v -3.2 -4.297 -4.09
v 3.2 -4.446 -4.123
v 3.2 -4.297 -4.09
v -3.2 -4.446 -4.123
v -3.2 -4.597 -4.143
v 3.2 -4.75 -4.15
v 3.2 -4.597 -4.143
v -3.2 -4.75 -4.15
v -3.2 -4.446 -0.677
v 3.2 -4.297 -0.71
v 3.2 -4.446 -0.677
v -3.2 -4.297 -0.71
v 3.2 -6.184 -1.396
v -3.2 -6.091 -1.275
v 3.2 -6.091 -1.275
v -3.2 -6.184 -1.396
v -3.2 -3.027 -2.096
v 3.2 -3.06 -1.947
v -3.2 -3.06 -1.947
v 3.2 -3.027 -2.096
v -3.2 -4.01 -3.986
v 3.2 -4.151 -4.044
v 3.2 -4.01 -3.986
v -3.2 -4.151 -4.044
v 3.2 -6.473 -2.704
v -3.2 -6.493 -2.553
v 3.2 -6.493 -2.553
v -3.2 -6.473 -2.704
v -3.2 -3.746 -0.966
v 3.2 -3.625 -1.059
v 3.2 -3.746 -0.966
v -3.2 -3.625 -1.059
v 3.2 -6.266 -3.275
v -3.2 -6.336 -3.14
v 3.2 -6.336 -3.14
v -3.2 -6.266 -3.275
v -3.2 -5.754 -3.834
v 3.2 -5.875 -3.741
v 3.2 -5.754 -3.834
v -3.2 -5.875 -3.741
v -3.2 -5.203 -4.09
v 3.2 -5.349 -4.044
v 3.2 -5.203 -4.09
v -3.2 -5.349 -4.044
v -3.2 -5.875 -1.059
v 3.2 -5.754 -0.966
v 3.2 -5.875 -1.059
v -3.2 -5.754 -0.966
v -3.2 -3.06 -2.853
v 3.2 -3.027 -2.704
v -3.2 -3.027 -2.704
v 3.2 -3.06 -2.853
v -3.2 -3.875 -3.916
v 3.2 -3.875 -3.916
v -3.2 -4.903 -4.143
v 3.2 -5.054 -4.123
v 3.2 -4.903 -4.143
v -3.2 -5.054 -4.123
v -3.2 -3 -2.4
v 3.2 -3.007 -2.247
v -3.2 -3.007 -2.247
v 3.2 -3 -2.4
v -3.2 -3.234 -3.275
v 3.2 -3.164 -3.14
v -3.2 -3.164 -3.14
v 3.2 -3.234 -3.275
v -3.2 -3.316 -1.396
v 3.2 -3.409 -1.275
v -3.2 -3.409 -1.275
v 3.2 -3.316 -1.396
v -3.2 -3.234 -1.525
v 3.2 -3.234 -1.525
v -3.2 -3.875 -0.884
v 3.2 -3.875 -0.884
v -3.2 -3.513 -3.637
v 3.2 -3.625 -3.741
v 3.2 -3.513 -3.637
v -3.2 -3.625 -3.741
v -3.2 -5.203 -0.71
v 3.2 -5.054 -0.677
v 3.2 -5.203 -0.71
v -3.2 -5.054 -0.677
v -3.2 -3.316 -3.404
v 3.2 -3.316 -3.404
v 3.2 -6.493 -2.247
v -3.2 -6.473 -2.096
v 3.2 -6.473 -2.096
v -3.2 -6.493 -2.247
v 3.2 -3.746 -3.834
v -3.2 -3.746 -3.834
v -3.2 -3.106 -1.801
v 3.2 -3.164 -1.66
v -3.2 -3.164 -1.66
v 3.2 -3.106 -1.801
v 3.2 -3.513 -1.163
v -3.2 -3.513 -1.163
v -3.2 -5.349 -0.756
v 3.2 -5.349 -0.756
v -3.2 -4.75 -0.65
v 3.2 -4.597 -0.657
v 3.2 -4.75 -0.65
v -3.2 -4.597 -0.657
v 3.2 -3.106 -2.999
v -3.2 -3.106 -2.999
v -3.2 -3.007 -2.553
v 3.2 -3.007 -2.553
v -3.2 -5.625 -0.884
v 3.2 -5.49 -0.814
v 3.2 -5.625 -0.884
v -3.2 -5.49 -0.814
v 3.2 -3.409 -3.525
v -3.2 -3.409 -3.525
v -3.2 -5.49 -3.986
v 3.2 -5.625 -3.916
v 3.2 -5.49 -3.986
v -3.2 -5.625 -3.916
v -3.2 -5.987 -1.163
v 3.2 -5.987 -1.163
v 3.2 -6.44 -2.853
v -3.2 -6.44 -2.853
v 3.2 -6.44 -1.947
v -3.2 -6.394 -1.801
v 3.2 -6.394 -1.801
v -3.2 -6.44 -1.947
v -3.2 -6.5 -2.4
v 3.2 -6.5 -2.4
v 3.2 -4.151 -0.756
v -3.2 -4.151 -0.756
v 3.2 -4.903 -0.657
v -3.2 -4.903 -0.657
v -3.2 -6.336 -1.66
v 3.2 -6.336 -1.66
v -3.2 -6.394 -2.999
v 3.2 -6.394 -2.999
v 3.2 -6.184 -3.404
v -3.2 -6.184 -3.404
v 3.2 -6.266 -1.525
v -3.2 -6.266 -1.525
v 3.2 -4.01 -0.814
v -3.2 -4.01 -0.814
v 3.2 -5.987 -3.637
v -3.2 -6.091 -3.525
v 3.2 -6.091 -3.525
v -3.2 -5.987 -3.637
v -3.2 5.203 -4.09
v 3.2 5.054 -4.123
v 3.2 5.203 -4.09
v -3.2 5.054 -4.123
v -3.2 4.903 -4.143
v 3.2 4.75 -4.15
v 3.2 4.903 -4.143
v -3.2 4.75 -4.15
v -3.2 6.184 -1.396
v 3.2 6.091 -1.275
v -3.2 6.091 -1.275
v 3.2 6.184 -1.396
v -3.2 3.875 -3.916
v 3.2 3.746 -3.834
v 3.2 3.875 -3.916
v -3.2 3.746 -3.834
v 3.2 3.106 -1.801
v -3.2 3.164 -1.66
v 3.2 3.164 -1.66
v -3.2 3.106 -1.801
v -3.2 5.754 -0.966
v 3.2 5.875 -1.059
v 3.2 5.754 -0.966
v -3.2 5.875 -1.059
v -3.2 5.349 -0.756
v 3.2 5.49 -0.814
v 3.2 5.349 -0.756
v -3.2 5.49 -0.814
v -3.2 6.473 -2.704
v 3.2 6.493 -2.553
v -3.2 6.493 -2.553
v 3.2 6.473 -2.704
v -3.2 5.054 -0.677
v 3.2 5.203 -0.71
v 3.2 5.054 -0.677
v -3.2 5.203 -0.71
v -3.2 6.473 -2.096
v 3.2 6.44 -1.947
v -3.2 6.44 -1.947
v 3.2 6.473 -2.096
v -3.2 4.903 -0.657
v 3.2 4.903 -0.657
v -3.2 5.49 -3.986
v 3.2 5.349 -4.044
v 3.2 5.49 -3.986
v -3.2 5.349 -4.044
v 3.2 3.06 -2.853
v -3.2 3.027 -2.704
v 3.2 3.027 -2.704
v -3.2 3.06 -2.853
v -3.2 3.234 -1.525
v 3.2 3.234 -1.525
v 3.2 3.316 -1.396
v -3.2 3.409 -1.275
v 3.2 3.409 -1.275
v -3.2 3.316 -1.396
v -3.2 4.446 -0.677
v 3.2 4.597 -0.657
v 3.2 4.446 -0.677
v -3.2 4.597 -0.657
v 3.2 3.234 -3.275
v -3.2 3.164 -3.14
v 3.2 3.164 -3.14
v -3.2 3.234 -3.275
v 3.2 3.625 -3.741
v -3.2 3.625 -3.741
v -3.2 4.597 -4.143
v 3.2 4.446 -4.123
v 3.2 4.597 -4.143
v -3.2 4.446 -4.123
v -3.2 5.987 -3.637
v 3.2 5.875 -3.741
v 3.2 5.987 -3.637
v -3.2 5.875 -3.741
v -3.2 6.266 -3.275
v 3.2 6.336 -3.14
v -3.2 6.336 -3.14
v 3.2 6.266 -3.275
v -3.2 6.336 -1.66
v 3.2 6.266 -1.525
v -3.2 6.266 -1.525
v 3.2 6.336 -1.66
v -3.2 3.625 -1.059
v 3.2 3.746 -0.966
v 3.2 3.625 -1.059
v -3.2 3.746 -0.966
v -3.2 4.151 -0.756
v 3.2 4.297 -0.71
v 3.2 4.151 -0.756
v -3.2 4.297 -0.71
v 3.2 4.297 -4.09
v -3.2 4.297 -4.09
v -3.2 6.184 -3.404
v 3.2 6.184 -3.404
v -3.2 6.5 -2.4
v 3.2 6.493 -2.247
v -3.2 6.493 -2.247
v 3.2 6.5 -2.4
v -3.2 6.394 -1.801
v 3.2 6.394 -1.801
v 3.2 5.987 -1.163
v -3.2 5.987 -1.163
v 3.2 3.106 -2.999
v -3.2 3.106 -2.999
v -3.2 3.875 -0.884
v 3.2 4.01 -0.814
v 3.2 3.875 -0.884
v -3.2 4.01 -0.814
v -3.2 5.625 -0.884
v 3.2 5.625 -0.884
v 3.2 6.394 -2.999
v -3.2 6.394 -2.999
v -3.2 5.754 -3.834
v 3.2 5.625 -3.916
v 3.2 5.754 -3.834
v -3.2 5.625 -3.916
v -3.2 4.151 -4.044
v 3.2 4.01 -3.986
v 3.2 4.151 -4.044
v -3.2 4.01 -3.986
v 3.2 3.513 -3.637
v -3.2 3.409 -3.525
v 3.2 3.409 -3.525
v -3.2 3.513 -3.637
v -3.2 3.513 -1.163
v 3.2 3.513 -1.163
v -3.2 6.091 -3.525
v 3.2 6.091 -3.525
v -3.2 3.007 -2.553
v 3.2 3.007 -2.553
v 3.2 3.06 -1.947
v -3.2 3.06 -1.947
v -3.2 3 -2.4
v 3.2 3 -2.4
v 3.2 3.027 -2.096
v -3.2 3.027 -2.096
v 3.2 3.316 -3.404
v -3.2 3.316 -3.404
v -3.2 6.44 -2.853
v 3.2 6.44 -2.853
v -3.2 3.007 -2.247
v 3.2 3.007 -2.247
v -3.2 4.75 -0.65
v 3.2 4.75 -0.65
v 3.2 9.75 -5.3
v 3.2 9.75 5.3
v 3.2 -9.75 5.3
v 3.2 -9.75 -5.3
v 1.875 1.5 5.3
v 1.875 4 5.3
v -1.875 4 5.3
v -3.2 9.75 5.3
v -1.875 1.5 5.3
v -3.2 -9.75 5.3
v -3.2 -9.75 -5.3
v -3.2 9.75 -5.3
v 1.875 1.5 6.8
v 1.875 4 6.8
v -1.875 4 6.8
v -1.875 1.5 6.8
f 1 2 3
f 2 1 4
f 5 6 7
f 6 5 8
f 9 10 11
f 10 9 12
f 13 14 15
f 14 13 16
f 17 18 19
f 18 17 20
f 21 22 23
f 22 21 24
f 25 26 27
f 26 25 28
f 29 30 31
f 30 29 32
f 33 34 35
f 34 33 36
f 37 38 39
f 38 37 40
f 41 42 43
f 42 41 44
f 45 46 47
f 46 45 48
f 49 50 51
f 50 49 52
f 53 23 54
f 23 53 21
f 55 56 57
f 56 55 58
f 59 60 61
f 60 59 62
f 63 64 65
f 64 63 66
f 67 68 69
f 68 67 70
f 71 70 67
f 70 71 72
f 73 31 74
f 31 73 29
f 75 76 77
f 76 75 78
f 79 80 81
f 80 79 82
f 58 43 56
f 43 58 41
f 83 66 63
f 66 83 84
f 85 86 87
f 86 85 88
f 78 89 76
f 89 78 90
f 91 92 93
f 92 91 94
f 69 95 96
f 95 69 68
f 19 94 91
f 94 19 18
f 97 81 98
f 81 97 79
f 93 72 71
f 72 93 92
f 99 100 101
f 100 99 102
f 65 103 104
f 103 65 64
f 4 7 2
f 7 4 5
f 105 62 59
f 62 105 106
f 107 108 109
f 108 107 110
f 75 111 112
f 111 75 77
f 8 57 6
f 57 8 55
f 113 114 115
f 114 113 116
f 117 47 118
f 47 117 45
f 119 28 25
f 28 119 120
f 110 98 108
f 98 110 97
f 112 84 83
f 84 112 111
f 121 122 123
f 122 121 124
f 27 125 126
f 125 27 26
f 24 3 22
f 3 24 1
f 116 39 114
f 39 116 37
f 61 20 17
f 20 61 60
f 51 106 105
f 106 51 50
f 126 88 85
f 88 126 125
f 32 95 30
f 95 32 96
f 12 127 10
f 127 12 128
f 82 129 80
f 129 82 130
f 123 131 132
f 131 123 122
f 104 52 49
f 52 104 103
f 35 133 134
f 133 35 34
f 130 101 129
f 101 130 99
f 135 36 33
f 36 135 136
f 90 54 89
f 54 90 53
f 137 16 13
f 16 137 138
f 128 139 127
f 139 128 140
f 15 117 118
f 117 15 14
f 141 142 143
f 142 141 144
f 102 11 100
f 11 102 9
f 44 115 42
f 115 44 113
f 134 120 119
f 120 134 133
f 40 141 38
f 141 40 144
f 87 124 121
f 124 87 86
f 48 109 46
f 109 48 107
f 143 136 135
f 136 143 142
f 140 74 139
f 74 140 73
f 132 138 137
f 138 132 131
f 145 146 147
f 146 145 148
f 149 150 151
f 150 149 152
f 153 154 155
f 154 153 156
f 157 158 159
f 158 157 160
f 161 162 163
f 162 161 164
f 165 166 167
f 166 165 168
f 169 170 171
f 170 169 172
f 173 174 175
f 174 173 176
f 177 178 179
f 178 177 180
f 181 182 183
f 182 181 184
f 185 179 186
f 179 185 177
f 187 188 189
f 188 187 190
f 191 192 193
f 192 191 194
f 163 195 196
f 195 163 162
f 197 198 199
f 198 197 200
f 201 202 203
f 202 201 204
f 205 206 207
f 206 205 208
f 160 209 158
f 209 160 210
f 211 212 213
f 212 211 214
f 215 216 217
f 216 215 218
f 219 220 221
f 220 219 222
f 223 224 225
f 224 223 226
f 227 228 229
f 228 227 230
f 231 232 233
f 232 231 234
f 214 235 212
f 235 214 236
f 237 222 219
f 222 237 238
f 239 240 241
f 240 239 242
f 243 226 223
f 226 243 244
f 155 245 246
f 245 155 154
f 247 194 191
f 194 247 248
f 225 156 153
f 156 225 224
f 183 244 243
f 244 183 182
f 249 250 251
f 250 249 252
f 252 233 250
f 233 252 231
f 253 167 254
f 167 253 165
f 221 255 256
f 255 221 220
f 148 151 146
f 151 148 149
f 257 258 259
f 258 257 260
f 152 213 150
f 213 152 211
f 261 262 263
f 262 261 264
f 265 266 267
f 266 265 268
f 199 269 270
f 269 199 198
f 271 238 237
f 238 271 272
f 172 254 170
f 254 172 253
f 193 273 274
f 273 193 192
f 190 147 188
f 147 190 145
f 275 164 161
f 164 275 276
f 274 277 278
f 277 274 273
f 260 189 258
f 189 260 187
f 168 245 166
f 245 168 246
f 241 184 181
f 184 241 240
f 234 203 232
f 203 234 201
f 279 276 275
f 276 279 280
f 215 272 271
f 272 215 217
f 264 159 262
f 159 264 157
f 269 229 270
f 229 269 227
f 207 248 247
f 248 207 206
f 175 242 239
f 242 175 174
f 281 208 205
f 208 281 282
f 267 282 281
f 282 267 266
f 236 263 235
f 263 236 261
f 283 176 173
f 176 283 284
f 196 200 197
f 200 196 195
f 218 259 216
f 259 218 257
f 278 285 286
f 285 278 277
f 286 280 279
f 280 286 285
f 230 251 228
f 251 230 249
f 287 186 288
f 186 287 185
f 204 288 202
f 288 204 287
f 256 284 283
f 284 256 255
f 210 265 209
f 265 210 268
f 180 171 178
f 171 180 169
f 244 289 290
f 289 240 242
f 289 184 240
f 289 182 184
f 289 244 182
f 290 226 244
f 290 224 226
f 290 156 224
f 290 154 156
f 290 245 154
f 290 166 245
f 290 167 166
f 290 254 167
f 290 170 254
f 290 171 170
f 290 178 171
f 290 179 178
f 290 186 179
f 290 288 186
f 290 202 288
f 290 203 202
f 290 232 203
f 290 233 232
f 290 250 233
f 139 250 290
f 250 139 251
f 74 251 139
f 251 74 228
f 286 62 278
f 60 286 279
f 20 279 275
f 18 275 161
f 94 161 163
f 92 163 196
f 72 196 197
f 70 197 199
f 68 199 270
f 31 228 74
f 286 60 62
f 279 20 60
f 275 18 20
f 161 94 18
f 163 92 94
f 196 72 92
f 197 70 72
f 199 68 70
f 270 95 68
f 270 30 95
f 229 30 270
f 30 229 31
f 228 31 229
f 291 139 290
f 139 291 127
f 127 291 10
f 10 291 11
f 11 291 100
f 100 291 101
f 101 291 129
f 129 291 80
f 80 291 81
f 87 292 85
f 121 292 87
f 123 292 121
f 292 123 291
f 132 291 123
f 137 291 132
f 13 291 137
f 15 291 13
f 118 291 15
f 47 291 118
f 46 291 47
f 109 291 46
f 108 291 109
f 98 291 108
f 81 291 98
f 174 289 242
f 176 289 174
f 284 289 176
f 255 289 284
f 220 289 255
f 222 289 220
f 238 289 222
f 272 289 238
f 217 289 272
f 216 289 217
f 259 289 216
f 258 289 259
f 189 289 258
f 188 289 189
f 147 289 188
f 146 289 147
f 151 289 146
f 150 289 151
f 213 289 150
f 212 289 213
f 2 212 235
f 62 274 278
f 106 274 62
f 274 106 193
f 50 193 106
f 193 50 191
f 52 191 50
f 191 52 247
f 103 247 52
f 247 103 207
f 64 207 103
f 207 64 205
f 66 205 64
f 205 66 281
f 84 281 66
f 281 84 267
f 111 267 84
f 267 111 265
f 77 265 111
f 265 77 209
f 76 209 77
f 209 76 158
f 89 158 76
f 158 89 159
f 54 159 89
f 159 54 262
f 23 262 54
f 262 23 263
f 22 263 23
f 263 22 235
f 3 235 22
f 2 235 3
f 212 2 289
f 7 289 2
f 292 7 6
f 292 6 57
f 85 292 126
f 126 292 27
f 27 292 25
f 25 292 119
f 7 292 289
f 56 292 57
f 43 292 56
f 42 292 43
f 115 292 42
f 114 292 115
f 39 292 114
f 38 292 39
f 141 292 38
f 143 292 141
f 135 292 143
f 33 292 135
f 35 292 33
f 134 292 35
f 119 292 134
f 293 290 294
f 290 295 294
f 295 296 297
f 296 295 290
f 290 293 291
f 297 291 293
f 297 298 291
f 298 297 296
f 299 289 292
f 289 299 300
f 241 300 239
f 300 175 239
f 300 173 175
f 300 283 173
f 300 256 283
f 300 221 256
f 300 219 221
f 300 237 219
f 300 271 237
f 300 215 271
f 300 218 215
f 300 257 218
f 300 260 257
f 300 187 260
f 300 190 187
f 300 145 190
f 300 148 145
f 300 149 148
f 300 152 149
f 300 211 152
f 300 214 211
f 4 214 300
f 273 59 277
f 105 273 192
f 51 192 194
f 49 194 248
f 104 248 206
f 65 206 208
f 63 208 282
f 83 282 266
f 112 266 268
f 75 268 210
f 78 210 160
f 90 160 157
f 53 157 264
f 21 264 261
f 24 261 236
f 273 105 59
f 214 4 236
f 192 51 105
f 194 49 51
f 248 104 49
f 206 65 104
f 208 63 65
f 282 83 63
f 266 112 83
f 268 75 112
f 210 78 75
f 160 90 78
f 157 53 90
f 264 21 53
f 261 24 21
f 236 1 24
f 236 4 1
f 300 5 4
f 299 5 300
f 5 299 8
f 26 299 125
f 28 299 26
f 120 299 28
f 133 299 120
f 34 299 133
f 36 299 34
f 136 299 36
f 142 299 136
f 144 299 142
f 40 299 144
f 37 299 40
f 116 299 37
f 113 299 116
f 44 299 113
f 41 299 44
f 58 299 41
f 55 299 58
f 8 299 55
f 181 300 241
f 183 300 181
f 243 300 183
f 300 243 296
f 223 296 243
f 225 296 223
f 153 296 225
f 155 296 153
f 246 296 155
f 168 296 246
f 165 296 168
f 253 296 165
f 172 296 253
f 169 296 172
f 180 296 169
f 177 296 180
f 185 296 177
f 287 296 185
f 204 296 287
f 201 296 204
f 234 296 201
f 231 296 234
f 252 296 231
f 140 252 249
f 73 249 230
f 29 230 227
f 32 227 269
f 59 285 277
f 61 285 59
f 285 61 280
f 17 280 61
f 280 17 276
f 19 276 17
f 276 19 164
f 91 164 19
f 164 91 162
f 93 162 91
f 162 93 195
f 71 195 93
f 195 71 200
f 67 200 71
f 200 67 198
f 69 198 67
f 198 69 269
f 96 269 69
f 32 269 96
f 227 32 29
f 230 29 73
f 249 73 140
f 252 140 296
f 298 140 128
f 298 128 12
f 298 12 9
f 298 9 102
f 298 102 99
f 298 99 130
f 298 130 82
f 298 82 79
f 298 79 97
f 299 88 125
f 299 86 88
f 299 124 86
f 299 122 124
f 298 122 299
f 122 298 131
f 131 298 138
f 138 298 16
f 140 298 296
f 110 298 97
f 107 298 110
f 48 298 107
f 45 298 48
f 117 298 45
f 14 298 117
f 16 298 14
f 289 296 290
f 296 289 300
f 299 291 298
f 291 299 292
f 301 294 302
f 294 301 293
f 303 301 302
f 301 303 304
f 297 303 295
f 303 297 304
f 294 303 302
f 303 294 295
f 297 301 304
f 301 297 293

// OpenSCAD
$fn = 72;

microswitch();

module microswitch(pressed=false)
{    
    // Main Body
    difference()
    {
        color("black")
        cube([6.4, 19.5, 10.6], center=true);
        
        // Mounting Holes
        union()
        {
            for (y_offset = [-9.5/2, 9.5/2])
            {
                translate([0,y_offset,-10.6/2 + 2.9])
                rotate([0,90,0])
                cylinder(d=3.5, h=10, center=true);
            }
        }
    }
    
    // Button
    if (pressed)
    {
        color("red")
        translate([0,-9.5/2 + 7.5,.5/2 + 10.6/2])
        cube([3.75,2.5,.5], center=true);
    }
    else
    {
        color("red")
        translate([0,-9.5/2 + 7.5,1.5/2 + 10.6/2])
        cube([3.75,2.5,1.5], center=true);        
    }
}
